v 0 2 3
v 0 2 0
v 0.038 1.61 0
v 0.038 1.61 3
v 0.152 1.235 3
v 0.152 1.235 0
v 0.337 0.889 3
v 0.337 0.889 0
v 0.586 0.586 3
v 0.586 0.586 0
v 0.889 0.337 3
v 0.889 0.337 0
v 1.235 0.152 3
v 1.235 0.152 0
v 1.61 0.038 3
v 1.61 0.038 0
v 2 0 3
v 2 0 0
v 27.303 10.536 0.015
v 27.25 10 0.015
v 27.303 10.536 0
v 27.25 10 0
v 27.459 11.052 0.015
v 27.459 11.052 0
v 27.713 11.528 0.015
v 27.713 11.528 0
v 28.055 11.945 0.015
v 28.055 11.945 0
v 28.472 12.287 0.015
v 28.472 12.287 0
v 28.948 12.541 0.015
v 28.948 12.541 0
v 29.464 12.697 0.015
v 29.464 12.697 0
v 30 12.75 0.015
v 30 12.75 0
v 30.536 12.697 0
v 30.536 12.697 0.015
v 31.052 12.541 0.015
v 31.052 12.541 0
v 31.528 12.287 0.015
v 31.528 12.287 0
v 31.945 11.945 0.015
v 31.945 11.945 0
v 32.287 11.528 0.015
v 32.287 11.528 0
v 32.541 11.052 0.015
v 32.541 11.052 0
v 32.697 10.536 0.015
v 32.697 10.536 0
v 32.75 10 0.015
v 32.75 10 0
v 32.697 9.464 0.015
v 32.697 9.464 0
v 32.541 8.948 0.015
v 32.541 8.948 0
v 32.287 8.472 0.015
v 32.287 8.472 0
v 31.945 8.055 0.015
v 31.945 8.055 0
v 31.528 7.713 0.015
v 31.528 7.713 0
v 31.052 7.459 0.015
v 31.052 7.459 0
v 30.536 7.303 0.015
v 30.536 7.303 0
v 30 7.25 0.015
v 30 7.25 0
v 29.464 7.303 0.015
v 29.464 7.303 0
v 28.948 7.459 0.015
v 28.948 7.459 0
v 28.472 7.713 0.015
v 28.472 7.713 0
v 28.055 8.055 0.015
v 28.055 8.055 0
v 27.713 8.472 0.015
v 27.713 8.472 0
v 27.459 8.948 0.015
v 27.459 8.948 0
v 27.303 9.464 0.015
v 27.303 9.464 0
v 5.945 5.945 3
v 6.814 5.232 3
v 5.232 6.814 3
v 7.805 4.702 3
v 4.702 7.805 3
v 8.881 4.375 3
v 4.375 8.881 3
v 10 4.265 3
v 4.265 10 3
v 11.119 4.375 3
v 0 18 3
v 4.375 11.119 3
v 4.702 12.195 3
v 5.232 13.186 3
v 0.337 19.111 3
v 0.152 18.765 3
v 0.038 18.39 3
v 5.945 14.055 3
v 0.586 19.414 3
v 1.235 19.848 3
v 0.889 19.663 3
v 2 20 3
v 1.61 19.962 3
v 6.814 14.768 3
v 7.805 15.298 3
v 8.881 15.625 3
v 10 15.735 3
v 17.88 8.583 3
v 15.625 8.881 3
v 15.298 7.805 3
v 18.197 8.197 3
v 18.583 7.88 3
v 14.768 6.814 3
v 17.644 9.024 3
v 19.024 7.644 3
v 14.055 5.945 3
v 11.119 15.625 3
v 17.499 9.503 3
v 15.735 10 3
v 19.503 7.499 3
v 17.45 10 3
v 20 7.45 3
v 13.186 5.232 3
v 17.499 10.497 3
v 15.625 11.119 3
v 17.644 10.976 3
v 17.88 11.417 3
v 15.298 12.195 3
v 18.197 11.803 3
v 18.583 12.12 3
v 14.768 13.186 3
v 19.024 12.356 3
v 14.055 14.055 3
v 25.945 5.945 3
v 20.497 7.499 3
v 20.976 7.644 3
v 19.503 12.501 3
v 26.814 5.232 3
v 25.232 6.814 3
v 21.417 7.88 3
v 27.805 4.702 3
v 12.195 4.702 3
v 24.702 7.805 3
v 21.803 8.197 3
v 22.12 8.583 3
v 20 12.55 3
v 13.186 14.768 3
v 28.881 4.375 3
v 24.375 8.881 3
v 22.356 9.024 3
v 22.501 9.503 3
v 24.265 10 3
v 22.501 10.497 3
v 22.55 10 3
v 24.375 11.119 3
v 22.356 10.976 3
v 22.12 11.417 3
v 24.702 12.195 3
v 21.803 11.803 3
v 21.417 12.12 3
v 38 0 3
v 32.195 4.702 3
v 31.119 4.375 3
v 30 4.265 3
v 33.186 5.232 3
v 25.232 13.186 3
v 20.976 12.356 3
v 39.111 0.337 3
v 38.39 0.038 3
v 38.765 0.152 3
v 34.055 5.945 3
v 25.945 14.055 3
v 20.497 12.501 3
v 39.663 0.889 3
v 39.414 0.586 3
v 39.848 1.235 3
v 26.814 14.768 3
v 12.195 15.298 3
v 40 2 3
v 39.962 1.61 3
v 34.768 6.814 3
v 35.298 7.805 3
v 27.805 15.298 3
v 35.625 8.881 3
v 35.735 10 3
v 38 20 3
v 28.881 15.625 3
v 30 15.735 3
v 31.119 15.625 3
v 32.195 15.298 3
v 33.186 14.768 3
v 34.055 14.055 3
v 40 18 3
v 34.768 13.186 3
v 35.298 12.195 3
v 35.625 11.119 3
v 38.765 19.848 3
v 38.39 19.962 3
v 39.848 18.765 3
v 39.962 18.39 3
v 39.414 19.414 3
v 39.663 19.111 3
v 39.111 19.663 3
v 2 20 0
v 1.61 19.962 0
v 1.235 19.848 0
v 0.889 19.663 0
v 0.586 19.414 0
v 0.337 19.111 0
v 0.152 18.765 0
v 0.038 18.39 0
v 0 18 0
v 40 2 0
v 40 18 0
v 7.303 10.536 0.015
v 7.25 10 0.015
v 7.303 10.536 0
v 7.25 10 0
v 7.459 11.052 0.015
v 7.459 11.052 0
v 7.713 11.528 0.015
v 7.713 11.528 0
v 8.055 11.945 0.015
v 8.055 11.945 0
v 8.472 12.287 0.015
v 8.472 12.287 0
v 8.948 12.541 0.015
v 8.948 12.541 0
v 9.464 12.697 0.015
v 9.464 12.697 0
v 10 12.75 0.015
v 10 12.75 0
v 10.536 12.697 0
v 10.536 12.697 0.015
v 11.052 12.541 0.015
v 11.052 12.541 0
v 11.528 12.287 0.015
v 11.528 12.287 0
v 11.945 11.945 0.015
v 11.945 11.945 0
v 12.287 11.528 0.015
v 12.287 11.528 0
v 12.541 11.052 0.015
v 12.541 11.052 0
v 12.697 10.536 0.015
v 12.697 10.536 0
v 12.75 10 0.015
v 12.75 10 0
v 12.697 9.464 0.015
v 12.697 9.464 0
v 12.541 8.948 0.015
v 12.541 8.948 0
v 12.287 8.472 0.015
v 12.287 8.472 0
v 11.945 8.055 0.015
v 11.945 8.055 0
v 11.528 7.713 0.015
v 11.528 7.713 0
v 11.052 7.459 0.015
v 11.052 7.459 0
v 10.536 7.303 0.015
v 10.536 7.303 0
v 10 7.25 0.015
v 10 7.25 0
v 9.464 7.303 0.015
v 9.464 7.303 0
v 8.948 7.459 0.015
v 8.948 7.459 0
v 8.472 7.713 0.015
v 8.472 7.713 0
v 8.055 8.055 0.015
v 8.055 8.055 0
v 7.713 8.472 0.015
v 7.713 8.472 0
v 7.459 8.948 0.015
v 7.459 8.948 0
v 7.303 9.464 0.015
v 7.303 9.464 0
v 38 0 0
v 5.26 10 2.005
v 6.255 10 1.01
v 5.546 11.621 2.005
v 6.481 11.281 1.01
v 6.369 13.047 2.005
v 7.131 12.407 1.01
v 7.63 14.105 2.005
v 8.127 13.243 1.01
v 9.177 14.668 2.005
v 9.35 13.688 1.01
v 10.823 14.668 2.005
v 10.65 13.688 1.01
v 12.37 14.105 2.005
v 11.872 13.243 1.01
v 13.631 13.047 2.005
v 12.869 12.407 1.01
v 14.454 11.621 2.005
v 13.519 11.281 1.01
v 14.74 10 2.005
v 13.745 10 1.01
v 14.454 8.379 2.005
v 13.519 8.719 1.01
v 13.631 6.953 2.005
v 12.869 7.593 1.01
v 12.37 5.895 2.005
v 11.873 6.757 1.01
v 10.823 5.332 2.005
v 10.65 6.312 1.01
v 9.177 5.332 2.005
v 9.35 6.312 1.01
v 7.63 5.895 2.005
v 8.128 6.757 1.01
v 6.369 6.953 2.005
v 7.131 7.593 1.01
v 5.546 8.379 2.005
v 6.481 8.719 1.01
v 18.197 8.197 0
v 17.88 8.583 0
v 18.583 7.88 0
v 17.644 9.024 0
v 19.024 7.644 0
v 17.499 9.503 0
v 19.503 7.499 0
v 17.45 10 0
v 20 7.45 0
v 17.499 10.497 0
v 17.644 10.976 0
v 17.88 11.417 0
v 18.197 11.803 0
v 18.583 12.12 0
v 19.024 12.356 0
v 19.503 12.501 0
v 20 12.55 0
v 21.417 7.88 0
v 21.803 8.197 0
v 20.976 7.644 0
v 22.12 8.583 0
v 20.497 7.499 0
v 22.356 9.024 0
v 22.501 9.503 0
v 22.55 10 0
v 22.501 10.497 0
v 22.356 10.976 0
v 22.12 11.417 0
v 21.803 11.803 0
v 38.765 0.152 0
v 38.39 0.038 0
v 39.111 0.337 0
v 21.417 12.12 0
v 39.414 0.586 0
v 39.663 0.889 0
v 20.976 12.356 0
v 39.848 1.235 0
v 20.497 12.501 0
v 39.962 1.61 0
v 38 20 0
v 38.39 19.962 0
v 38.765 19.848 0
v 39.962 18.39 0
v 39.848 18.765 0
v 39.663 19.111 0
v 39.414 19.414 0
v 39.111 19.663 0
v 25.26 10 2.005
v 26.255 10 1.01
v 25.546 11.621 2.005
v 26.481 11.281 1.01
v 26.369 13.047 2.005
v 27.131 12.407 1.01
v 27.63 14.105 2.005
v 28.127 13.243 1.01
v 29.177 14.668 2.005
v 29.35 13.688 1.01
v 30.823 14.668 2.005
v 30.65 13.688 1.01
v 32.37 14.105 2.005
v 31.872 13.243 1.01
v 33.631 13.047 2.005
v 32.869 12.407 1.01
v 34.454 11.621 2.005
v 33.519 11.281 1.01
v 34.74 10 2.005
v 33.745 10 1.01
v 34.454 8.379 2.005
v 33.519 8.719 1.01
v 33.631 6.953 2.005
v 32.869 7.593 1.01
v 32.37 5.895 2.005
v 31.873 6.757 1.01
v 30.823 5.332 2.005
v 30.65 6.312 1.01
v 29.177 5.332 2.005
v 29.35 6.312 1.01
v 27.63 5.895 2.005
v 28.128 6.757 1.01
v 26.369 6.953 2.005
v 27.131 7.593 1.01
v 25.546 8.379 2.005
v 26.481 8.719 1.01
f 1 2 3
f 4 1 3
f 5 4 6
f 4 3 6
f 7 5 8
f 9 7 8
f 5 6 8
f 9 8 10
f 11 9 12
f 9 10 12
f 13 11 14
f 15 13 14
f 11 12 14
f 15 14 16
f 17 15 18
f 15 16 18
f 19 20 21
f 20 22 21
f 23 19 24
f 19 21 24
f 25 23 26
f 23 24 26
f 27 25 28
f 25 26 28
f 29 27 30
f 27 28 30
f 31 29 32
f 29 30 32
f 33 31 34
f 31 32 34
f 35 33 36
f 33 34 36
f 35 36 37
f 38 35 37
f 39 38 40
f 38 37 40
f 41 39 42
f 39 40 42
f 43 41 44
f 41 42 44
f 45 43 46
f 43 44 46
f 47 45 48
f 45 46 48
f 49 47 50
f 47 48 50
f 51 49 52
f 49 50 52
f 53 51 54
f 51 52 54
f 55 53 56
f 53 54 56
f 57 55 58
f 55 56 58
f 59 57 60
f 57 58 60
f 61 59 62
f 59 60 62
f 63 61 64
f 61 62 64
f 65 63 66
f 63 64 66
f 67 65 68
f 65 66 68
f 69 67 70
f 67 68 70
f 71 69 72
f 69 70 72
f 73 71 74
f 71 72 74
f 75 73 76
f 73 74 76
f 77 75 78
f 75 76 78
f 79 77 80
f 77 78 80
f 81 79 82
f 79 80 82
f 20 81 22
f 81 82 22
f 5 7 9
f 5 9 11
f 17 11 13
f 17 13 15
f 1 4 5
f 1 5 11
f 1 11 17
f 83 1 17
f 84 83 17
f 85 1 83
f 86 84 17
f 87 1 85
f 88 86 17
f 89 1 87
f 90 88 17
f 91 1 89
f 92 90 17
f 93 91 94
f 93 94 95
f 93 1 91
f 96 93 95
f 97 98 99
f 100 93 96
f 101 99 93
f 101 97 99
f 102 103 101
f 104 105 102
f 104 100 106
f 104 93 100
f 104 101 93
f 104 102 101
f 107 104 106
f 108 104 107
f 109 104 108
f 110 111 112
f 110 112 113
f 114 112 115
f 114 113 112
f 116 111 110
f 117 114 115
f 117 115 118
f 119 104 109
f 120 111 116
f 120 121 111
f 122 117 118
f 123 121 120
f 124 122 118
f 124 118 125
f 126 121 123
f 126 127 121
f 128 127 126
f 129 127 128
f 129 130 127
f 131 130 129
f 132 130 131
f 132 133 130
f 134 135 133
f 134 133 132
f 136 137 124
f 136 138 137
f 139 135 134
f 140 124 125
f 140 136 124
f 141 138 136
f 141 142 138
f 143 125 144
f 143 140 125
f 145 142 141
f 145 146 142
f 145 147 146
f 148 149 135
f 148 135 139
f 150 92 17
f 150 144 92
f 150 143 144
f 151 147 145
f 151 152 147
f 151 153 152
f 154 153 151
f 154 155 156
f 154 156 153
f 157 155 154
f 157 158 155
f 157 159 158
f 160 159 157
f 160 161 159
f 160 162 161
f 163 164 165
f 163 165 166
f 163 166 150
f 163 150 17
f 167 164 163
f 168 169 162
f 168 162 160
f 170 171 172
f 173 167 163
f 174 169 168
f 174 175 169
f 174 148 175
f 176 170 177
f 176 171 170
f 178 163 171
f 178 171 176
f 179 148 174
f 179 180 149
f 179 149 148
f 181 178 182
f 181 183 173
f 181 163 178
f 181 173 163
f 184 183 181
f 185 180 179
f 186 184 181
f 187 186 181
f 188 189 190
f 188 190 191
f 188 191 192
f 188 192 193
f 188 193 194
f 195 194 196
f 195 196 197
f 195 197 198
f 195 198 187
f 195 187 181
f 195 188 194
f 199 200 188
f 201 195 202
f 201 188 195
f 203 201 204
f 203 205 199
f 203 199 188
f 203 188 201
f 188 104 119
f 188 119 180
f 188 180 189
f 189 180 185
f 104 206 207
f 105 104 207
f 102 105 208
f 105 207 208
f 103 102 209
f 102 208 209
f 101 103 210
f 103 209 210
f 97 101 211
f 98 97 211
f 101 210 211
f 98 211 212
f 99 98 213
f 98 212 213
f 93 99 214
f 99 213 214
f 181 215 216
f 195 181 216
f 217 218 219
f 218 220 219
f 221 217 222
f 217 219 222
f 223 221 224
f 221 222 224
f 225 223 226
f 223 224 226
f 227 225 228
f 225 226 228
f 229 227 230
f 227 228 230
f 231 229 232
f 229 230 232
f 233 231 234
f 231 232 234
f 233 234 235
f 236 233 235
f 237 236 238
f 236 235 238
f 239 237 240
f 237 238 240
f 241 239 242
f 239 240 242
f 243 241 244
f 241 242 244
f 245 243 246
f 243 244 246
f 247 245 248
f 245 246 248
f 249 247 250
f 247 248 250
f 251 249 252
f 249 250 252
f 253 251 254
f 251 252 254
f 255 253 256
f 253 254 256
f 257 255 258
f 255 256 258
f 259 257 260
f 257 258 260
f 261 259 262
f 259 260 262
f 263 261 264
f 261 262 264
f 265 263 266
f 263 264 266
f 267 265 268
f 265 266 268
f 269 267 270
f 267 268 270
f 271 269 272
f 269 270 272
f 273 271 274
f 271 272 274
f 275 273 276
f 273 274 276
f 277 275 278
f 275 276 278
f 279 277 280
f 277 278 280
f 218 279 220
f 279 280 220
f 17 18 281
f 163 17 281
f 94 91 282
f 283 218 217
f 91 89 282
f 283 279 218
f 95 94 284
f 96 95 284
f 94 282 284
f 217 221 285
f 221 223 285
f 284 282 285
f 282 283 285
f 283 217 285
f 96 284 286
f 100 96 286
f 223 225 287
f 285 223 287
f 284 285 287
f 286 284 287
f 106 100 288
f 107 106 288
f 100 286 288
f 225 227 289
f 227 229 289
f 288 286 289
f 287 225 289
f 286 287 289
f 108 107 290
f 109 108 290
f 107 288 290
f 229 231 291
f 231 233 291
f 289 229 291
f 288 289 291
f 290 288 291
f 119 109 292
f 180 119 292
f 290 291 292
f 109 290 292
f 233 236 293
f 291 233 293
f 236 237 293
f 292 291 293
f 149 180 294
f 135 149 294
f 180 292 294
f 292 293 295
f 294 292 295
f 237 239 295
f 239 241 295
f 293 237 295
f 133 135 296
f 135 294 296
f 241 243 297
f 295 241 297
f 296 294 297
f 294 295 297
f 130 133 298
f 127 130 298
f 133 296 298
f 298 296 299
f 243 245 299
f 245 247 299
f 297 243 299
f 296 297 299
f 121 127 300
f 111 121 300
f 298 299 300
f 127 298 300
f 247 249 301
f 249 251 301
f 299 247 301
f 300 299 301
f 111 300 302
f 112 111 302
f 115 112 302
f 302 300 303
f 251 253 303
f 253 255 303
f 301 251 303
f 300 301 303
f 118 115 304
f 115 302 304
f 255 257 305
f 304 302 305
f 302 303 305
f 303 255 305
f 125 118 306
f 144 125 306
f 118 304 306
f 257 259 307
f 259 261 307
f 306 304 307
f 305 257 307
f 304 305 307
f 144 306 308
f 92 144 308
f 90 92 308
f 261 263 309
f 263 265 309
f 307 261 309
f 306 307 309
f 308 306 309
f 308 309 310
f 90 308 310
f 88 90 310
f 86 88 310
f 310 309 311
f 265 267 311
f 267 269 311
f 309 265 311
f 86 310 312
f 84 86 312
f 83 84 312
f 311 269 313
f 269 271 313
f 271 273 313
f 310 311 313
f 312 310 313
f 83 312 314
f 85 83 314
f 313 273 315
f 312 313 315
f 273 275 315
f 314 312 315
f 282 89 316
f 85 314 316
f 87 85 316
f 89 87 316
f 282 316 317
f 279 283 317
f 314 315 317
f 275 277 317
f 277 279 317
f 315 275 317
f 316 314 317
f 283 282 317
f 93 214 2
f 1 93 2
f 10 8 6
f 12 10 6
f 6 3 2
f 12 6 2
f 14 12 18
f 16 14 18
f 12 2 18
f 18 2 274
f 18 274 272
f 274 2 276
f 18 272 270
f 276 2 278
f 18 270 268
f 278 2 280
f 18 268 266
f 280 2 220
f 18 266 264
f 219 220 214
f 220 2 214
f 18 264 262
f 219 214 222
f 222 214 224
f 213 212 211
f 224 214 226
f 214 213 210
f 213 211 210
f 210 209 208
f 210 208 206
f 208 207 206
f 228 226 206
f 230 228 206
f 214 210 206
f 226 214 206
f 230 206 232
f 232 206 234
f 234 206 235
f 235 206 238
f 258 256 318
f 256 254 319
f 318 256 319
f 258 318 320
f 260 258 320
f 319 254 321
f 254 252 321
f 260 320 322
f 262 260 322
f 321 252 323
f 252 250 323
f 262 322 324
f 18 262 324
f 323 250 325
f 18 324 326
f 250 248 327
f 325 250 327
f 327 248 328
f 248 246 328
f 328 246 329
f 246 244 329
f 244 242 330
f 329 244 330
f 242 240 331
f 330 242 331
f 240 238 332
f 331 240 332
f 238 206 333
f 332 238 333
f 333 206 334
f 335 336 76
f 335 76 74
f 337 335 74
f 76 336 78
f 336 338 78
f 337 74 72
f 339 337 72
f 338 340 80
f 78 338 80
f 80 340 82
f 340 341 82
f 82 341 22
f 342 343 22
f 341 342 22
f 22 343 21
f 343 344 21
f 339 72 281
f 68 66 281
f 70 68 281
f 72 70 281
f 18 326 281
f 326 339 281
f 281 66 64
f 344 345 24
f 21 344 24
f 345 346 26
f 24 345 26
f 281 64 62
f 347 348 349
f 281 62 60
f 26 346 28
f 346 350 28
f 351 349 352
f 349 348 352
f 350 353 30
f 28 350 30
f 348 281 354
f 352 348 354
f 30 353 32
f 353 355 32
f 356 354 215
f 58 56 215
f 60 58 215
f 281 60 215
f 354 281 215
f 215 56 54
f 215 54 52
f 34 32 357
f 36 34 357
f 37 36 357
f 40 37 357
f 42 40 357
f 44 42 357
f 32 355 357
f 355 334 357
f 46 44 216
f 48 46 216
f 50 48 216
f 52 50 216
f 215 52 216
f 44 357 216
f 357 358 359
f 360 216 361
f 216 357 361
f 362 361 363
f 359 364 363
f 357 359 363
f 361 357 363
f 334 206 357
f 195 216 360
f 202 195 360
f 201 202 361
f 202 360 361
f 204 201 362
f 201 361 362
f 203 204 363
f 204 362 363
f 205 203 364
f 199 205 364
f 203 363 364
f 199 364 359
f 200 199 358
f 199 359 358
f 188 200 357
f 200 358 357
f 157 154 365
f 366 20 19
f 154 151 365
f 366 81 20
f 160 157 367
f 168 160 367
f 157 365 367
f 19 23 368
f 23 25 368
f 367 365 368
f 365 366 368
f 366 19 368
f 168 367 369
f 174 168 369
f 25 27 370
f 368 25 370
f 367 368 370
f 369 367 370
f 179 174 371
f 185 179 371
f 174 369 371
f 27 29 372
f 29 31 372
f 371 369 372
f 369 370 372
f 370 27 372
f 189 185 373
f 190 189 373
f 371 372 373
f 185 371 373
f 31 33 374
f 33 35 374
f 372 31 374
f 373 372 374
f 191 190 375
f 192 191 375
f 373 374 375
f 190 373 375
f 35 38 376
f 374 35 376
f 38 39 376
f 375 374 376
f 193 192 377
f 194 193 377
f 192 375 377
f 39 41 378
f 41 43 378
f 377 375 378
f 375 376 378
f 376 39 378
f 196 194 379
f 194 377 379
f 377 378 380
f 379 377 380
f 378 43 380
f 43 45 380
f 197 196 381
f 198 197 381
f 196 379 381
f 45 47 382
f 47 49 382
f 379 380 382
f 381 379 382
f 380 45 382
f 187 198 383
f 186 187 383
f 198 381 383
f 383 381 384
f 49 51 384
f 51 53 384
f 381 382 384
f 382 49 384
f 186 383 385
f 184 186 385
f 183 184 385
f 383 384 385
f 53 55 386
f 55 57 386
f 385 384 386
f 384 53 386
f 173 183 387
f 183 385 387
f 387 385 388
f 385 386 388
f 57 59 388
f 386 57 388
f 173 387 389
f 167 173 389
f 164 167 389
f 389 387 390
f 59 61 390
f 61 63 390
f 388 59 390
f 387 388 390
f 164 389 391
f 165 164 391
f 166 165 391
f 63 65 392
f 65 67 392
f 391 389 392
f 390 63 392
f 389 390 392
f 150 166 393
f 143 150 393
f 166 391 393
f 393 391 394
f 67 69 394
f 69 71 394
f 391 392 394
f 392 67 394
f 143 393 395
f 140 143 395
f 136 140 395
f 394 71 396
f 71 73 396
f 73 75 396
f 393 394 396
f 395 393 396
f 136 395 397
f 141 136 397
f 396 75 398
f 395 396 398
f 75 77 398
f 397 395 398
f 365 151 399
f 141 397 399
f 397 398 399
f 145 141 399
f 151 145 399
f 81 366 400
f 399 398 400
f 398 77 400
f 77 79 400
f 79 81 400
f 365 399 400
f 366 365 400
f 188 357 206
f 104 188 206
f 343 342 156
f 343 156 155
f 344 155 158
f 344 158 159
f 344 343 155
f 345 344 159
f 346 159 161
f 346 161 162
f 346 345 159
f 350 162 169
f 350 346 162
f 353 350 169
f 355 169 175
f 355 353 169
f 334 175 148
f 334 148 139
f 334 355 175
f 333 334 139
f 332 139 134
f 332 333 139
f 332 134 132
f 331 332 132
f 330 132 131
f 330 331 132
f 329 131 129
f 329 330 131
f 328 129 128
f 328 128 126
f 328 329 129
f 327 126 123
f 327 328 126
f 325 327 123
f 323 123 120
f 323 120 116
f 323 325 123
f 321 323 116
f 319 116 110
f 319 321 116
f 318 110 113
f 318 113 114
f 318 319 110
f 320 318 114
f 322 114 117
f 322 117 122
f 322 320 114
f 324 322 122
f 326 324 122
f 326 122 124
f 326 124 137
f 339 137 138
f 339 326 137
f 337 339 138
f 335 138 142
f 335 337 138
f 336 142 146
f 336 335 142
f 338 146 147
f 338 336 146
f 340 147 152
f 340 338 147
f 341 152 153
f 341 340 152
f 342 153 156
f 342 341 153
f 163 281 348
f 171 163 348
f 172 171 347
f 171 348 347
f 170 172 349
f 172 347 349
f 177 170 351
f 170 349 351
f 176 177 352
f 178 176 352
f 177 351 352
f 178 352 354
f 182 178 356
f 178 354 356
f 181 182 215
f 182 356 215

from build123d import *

# Parameters (mm, degrees)
CROQUIS1_R                                           = 2.55
SALIENTE_EXTRUIR1_DEPTH                              = 3
AVELLANADO_PARA_TORNILLO_CON_CABEZA_AVEL_D           = 5.5
AVELLANADO_PARA_TORNILLO_CON_CABEZA_AVEL_DEPTH       = 5
AVELLANADO_PARA_TORNILLO_CON_CABEZA_AVEL_CSINK_D     = 11.47
AVELLANADO_PARA_TORNILLO_CON_CABEZA_AVEL_CSINK_ANGLE = 90
AVELLANADO_PARA_TORNILLO_CON_CABEZA_AVEL_TIP         = 1.652366702


with BuildPart() as part:
    # Croquis1 → Saliente-Extruir1 (new body)
    with BuildSketch(Plane.XY):
        with BuildLine():
            Line((2, 0), (38, 0))
            ThreePointArc((38, 0), (39.414213562, 0.585786438), (40, 2))
            Line((40, 2), (40, 18))
            ThreePointArc((40, 18), (39.414213562, 19.414213562), (38, 20))
            Line((38, 20), (2, 20))
            ThreePointArc((2, 20), (0.585786438, 19.414213562), (0, 18))
            Line((0, 18), (0, 2))
            ThreePointArc((0, 2), (0.585786438, 0.585786438), (2, 0))
        make_face()
        with Locations((10, 10)):
            Circle(CROQUIS1_R, mode=Mode.SUBTRACT)
        with Locations((20, 10)):
            Circle(CROQUIS1_R, mode=Mode.SUBTRACT)
        with Locations((30, 10)):
            Circle(CROQUIS1_R, mode=Mode.SUBTRACT)
    extrude(amount=SALIENTE_EXTRUIR1_DEPTH)

    # Avellanado para tornillo con cabeza avellanada de clavija hexagonal de M51
    with Locations(Plane.XY.offset(3)):
        with Locations((10, 10), (30, 10)):
            CounterSinkHole(AVELLANADO_PARA_TORNILLO_CON_CABEZA_AVEL_D / 2, AVELLANADO_PARA_TORNILLO_CON_CABEZA_AVEL_CSINK_D / 2, depth=AVELLANADO_PARA_TORNILLO_CON_CABEZA_AVEL_DEPTH, counter_sink_angle=AVELLANADO_PARA_TORNILLO_CON_CABEZA_AVEL_CSINK_ANGLE)
            with Locations((0, 0, -(AVELLANADO_PARA_TORNILLO_CON_CABEZA_AVEL_DEPTH + AVELLANADO_PARA_TORNILLO_CON_CABEZA_AVEL_TIP / 2))):  # 118° drill point
                Cone(0, AVELLANADO_PARA_TORNILLO_CON_CABEZA_AVEL_D / 2, AVELLANADO_PARA_TORNILLO_CON_CABEZA_AVEL_TIP, mode=Mode.SUBTRACT)


solid = part.part
